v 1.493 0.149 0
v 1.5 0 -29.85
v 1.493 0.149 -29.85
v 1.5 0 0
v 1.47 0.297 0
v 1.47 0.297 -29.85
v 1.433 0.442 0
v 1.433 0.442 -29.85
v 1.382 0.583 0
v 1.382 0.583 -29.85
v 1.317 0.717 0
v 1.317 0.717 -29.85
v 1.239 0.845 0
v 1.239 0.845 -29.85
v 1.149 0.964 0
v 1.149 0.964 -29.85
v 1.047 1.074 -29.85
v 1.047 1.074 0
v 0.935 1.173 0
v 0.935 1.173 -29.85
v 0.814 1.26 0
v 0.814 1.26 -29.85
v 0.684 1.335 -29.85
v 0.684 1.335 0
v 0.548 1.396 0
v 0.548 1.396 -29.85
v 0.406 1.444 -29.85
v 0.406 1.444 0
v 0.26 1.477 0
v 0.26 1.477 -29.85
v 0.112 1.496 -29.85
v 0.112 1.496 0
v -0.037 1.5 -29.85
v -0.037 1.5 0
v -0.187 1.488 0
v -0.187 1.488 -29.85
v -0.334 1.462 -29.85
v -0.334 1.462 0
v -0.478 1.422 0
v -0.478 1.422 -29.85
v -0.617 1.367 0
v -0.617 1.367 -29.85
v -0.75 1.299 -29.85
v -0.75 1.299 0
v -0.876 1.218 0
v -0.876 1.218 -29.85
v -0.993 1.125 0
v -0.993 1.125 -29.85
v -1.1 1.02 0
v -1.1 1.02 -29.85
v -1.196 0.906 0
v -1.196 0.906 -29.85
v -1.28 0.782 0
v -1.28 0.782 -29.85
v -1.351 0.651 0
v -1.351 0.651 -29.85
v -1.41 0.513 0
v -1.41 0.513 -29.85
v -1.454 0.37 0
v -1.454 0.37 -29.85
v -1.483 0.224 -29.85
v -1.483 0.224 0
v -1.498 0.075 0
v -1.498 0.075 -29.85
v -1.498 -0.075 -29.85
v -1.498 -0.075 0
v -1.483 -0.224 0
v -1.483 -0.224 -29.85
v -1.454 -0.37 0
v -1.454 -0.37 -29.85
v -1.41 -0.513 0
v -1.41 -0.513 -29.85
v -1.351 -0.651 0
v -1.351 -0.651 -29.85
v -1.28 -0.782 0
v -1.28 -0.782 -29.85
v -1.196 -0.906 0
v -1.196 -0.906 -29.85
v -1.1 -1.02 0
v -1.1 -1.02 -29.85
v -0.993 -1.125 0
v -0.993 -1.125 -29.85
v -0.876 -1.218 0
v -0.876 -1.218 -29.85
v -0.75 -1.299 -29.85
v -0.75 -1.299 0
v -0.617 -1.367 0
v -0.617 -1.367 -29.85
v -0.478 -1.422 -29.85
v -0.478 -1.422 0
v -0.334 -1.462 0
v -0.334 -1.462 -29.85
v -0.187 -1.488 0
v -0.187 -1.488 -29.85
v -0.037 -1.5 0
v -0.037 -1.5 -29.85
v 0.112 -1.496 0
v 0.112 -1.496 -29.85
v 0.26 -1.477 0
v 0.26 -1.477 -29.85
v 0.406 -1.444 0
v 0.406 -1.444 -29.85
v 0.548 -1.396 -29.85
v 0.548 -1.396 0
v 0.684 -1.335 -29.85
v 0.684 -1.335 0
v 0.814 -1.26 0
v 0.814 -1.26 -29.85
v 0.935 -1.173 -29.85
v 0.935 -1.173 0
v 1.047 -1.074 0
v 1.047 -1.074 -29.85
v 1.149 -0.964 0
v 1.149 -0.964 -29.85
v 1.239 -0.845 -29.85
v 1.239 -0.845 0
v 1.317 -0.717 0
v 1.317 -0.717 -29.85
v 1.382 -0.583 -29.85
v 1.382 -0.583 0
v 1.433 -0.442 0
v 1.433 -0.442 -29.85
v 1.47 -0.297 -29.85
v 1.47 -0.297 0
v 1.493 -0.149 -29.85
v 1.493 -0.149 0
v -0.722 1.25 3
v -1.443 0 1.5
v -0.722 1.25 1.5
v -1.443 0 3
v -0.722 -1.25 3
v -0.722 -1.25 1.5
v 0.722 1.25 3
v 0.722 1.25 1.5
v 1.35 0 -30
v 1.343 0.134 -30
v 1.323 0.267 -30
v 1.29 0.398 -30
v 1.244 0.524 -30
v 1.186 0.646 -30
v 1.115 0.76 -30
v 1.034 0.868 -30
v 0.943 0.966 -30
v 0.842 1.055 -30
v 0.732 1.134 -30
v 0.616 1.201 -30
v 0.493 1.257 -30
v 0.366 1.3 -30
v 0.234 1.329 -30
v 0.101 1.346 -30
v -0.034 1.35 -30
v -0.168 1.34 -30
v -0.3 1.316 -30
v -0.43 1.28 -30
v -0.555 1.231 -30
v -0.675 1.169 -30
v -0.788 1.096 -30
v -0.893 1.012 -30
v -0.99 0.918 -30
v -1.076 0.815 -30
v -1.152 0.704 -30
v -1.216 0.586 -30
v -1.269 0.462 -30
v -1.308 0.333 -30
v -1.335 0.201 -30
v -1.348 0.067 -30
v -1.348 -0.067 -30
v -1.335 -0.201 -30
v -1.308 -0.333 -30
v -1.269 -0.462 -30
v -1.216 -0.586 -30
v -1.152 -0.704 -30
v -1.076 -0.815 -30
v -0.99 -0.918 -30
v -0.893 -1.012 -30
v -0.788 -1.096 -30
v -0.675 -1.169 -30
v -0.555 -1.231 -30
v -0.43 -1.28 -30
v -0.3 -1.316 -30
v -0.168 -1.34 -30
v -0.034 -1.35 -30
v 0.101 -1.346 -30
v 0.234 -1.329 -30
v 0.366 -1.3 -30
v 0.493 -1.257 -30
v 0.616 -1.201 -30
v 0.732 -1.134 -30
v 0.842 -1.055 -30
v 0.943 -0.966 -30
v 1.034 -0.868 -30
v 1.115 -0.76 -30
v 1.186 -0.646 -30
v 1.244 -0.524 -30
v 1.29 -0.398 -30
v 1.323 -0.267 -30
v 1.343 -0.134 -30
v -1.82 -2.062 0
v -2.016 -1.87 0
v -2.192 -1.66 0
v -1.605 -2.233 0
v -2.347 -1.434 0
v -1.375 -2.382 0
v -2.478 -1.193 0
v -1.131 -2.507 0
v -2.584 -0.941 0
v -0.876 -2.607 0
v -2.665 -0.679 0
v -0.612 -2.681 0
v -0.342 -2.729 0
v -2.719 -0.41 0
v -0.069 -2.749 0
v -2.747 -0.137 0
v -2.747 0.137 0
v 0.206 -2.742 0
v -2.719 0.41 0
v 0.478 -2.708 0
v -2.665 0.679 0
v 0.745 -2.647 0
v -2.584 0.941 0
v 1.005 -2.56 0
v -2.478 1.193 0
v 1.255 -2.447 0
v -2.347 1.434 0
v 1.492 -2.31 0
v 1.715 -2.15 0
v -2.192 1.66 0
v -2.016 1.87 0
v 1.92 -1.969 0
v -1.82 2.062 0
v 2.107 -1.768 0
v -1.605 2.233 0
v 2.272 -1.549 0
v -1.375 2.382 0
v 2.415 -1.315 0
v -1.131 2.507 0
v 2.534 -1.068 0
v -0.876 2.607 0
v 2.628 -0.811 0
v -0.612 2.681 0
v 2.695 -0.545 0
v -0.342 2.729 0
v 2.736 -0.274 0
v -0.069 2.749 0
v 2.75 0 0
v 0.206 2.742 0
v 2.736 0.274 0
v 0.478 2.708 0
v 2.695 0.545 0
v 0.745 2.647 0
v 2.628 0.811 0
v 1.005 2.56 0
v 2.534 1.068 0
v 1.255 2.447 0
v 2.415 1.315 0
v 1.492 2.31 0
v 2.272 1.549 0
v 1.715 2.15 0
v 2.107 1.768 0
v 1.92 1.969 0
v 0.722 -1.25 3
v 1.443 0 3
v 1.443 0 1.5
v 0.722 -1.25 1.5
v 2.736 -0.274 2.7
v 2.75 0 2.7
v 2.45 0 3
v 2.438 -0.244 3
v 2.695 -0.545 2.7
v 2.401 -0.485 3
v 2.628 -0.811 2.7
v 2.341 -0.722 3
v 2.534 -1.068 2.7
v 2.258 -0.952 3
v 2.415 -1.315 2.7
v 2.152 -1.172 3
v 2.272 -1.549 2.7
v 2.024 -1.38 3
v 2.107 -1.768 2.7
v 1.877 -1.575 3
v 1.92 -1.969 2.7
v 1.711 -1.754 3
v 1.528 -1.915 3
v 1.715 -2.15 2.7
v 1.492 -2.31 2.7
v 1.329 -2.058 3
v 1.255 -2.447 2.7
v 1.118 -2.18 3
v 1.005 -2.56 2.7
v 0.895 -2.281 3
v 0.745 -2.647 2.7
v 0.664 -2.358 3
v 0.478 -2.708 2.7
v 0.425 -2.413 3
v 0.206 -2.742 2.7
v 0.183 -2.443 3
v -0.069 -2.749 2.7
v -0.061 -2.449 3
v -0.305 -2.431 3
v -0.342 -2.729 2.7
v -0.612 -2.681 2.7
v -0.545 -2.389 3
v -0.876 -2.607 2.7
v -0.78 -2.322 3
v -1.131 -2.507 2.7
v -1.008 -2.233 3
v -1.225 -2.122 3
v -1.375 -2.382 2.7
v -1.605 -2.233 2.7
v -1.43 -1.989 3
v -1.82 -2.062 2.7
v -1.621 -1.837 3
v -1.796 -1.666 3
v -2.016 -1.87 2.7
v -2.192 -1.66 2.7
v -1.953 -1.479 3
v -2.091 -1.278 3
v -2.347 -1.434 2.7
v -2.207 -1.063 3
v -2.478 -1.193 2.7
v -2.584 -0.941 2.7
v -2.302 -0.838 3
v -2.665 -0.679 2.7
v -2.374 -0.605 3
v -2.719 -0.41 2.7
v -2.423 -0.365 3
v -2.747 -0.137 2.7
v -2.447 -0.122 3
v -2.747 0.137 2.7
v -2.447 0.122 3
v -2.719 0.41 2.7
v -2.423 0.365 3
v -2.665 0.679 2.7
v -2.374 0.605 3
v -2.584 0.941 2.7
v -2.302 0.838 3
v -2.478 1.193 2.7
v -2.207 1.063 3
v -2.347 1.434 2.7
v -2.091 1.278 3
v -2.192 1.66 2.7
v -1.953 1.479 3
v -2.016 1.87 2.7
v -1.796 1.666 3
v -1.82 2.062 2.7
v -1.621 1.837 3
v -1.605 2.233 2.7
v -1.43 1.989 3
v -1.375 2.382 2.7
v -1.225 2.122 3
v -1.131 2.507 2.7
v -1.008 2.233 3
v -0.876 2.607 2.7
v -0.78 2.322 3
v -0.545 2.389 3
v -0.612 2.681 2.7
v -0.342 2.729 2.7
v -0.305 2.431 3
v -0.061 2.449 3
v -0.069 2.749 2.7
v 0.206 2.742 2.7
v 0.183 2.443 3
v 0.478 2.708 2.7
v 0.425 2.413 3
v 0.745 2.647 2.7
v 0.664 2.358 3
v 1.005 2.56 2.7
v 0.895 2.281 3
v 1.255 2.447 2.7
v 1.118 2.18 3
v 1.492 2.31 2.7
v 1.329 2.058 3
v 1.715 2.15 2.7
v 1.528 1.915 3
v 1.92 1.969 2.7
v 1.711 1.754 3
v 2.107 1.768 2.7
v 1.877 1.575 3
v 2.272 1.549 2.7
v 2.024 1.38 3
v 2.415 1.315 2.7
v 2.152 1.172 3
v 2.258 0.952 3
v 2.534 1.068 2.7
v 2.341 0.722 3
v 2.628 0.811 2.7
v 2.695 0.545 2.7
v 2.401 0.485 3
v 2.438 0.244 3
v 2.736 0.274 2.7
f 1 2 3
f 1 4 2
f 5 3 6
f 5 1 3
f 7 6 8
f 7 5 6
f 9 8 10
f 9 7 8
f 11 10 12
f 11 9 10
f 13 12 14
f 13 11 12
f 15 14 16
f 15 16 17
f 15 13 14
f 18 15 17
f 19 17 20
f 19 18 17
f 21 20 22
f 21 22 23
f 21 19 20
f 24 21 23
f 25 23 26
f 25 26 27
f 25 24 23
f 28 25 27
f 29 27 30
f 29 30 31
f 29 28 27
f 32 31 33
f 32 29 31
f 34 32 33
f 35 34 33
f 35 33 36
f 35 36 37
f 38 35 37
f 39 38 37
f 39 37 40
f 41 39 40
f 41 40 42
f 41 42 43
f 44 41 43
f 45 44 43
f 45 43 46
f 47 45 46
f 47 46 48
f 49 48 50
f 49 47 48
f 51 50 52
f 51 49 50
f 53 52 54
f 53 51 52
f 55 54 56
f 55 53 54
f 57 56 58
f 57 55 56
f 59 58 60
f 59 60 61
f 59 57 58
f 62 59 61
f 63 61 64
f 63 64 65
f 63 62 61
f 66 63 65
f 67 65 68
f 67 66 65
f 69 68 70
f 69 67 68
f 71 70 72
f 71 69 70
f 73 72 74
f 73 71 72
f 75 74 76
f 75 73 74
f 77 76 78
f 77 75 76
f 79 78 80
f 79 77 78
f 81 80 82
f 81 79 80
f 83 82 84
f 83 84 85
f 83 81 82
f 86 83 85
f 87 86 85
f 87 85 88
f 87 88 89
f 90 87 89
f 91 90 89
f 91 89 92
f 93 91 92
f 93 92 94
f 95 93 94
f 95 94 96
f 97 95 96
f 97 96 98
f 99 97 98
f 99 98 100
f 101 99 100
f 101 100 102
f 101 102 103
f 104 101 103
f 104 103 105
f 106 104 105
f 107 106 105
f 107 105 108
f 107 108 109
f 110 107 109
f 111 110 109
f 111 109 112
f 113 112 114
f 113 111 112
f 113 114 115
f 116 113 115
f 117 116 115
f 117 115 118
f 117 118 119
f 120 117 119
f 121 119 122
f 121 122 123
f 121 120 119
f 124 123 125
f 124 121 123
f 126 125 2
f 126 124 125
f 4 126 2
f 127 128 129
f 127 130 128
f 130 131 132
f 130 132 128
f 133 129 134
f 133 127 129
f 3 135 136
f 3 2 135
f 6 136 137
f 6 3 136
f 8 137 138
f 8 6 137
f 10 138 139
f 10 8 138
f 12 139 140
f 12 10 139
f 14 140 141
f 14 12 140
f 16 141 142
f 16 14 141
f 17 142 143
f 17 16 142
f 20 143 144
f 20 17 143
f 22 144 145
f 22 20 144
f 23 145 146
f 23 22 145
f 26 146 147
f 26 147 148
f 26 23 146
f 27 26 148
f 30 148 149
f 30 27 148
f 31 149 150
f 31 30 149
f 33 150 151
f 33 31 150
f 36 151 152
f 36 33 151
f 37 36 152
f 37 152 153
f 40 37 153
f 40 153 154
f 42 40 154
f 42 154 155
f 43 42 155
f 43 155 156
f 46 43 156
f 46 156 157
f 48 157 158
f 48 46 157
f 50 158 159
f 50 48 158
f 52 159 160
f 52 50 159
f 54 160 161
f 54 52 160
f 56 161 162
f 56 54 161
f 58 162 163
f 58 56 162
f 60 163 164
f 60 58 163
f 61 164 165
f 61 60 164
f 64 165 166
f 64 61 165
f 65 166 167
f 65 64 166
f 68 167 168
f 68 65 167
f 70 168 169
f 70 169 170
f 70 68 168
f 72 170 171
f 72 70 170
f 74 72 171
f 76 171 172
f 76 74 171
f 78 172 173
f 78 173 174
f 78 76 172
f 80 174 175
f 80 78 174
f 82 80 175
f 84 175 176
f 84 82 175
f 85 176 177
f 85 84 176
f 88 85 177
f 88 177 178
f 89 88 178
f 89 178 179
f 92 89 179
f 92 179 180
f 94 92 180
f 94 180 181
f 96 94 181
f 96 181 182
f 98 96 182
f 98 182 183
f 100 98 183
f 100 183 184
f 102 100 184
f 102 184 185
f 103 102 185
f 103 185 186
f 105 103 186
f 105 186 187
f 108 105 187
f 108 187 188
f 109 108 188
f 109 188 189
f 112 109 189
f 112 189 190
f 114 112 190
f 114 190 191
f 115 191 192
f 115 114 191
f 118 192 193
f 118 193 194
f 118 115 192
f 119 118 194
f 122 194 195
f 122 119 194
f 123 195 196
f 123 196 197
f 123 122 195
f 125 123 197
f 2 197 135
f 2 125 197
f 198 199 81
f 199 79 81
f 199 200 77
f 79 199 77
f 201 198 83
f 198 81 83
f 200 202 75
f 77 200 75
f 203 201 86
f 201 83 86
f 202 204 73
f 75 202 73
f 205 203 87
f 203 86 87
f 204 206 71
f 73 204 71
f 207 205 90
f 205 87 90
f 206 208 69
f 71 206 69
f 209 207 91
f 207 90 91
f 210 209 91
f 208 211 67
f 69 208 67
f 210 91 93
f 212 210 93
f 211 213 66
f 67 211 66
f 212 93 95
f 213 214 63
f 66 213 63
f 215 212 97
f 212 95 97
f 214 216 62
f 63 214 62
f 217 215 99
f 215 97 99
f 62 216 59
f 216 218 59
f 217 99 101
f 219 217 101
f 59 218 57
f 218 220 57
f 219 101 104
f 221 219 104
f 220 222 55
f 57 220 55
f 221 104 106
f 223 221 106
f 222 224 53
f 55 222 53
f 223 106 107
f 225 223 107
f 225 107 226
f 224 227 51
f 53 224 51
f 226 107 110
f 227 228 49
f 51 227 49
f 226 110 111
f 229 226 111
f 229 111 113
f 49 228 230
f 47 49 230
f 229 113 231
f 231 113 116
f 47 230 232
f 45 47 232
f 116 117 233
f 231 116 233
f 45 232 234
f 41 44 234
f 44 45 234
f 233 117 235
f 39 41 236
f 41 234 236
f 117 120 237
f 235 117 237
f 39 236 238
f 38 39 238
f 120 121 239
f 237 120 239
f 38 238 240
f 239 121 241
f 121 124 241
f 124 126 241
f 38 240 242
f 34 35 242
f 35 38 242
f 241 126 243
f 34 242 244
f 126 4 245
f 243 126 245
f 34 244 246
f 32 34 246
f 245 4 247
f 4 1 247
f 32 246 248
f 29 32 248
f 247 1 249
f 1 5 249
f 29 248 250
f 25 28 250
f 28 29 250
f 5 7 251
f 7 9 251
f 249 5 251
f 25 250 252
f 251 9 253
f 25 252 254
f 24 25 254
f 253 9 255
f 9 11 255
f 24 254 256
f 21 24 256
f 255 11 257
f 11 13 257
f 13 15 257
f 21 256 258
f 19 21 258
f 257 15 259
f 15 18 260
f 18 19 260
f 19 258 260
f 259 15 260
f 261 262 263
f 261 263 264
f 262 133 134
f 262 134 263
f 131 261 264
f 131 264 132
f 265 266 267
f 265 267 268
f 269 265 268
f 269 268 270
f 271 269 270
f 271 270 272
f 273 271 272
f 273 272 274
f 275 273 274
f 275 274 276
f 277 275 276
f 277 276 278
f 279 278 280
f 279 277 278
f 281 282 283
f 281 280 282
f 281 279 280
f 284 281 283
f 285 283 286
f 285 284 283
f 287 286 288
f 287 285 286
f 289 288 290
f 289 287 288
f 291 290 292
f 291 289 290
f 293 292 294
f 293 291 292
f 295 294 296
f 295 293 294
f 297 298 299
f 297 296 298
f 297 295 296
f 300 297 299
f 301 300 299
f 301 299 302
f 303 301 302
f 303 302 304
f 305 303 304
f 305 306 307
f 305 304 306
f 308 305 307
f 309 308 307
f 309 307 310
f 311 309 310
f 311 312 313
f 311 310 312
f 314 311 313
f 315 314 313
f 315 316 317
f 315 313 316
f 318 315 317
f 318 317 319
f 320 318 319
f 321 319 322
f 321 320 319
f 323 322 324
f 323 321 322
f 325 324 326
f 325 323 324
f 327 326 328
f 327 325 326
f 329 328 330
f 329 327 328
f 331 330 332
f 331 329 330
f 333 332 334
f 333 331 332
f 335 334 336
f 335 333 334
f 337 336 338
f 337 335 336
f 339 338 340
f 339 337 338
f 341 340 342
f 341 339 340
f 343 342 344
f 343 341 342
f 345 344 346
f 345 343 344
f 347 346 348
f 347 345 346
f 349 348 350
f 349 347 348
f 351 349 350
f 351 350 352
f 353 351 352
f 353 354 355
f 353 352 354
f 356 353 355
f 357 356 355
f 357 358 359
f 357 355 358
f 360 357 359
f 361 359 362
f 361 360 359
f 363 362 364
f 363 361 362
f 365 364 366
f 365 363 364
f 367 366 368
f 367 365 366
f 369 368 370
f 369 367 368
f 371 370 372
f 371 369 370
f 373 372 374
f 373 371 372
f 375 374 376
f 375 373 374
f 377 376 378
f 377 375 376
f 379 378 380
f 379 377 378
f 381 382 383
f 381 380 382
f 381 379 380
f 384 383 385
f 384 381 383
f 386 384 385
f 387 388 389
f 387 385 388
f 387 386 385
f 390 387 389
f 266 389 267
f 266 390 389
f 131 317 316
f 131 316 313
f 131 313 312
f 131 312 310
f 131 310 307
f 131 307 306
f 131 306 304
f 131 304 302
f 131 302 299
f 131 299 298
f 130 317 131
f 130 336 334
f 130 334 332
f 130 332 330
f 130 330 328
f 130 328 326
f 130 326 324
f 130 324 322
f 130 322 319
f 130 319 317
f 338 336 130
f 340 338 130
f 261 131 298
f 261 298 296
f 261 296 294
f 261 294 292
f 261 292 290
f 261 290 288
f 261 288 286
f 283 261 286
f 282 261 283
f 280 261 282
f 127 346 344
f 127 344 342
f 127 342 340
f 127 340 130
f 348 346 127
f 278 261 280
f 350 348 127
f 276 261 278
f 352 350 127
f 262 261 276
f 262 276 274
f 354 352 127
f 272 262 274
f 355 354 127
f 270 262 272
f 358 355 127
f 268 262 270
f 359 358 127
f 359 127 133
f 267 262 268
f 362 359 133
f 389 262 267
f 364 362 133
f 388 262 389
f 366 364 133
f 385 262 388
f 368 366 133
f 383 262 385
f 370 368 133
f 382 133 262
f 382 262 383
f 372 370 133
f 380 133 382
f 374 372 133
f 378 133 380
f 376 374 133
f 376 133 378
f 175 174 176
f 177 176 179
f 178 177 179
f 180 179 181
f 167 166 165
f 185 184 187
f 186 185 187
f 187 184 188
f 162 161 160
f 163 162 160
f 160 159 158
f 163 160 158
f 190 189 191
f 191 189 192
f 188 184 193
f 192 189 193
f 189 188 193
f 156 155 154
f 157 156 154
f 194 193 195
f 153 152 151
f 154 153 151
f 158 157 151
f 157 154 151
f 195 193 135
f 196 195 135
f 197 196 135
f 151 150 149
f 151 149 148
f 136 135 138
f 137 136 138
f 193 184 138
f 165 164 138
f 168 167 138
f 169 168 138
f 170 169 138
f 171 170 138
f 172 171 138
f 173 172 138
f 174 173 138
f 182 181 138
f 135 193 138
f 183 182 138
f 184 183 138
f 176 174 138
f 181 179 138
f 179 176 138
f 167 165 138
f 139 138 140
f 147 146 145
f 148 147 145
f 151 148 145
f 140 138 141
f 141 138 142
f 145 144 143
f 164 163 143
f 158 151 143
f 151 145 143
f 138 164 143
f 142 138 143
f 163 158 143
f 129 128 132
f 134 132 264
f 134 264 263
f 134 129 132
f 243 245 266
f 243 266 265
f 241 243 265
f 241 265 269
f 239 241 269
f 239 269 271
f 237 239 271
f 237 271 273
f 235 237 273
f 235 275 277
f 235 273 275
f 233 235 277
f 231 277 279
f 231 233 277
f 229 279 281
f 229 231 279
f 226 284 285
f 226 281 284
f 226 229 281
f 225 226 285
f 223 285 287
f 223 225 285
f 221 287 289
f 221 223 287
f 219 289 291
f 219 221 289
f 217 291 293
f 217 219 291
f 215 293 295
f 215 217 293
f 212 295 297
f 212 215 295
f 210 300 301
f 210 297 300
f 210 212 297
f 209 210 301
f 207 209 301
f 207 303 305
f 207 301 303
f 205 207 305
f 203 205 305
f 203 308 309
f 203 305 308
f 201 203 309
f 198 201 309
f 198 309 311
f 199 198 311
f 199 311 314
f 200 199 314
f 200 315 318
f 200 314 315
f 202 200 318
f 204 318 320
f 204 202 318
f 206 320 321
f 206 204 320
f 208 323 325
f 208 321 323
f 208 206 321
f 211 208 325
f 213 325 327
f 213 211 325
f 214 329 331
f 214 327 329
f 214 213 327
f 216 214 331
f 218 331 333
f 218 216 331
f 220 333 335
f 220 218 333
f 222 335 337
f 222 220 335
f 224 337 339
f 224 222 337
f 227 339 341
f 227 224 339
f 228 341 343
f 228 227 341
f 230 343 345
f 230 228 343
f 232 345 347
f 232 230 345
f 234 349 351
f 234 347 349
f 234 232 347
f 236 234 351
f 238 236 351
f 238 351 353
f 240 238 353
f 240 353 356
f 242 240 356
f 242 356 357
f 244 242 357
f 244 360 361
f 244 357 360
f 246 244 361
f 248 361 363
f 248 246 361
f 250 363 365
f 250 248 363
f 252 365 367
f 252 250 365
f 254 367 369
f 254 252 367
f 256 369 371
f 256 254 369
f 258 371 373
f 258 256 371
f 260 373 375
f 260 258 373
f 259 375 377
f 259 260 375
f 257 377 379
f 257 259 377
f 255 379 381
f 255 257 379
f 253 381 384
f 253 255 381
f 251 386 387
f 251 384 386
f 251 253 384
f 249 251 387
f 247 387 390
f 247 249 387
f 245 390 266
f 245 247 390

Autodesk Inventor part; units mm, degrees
ref_plane "YZ Plane" through (0, 0, 0) normal (1, 0, 0) x (0, 1, 0)
ref_plane "XZ Plane" through (0, 0, 0) normal (0, 1, 0) x (-1, 0, 0)
ref_plane "XY Plane" through (0, 0, 0) normal (0, 0, 1) x (1, 0, 0)
sketch "Sketch3" plane through (0, 0, 0) normal (0, 0, 1) x (1, 0, 0)
  circle A0 centre (0, 0) radius 1.5
  dimension "Diameter" = 3
extrude "Extrusion1" add sketch "Sketch3" against normal blind 30
sketch "Sketch4" plane through (0, 0, 0) normal (0, 0, 1) x (1, 0, 0)
  circle A0 centre (0, 0) radius 1.5 projected
  circle A1 centre (0, 0) radius 2.75
  dimension "Head_Diameter" = 5.5
extrude "Extrusion2" add sketch "Sketch4" along normal blind 3 contours A0 | A1
sketch "Sketch5" plane through (0, 0, 3) normal (0, 0, 1) x (1, 0, 0)
  circle A0 centre (0, 0) radius 2.75 projected
  line L0 (1.4434, 0) -> (0.7217, -1.25)
  line L1 (0.7217, -1.25) -> (-0.7217, -1.25)
  line L2 (-0.7217, -1.25) -> (-1.4434, 0)
  line L3 (-1.4434, 0) -> (-0.7217, 1.25)
  line L4 (-0.7217, 1.25) -> (0.7217, 1.25)
  line L5 (0.7217, 1.25) -> (1.4434, 0)
  line L6 (0, 0) -> (1.4434, 0) construction
  dimension "Hex_Width" = 2.5
extrude "Extrusion3" cut sketch "Sketch5" against normal blind 1.5 contours L0 L1 L2 L3 L4 L5
thread "Thread1" size "M3x0.5" class "4g6g" standard "ANSI Metric M Profile" length 25
chamfer "Chamfer1" distance 0.3 angle 45 1 edges at (-2.75, 0, 3)
chamfer "Chamfer2" distance 0.15 angle 45 1 edges at (-1.5, 0, -30)
equation "\"d14\" = 0.5 * Chamfer"
equation "\"Chamfer\" = 0.3"
properties part number "SCREW,SOCKET-HD,P,12_9,M03X0_5X30MM" material "Steel, MS"
